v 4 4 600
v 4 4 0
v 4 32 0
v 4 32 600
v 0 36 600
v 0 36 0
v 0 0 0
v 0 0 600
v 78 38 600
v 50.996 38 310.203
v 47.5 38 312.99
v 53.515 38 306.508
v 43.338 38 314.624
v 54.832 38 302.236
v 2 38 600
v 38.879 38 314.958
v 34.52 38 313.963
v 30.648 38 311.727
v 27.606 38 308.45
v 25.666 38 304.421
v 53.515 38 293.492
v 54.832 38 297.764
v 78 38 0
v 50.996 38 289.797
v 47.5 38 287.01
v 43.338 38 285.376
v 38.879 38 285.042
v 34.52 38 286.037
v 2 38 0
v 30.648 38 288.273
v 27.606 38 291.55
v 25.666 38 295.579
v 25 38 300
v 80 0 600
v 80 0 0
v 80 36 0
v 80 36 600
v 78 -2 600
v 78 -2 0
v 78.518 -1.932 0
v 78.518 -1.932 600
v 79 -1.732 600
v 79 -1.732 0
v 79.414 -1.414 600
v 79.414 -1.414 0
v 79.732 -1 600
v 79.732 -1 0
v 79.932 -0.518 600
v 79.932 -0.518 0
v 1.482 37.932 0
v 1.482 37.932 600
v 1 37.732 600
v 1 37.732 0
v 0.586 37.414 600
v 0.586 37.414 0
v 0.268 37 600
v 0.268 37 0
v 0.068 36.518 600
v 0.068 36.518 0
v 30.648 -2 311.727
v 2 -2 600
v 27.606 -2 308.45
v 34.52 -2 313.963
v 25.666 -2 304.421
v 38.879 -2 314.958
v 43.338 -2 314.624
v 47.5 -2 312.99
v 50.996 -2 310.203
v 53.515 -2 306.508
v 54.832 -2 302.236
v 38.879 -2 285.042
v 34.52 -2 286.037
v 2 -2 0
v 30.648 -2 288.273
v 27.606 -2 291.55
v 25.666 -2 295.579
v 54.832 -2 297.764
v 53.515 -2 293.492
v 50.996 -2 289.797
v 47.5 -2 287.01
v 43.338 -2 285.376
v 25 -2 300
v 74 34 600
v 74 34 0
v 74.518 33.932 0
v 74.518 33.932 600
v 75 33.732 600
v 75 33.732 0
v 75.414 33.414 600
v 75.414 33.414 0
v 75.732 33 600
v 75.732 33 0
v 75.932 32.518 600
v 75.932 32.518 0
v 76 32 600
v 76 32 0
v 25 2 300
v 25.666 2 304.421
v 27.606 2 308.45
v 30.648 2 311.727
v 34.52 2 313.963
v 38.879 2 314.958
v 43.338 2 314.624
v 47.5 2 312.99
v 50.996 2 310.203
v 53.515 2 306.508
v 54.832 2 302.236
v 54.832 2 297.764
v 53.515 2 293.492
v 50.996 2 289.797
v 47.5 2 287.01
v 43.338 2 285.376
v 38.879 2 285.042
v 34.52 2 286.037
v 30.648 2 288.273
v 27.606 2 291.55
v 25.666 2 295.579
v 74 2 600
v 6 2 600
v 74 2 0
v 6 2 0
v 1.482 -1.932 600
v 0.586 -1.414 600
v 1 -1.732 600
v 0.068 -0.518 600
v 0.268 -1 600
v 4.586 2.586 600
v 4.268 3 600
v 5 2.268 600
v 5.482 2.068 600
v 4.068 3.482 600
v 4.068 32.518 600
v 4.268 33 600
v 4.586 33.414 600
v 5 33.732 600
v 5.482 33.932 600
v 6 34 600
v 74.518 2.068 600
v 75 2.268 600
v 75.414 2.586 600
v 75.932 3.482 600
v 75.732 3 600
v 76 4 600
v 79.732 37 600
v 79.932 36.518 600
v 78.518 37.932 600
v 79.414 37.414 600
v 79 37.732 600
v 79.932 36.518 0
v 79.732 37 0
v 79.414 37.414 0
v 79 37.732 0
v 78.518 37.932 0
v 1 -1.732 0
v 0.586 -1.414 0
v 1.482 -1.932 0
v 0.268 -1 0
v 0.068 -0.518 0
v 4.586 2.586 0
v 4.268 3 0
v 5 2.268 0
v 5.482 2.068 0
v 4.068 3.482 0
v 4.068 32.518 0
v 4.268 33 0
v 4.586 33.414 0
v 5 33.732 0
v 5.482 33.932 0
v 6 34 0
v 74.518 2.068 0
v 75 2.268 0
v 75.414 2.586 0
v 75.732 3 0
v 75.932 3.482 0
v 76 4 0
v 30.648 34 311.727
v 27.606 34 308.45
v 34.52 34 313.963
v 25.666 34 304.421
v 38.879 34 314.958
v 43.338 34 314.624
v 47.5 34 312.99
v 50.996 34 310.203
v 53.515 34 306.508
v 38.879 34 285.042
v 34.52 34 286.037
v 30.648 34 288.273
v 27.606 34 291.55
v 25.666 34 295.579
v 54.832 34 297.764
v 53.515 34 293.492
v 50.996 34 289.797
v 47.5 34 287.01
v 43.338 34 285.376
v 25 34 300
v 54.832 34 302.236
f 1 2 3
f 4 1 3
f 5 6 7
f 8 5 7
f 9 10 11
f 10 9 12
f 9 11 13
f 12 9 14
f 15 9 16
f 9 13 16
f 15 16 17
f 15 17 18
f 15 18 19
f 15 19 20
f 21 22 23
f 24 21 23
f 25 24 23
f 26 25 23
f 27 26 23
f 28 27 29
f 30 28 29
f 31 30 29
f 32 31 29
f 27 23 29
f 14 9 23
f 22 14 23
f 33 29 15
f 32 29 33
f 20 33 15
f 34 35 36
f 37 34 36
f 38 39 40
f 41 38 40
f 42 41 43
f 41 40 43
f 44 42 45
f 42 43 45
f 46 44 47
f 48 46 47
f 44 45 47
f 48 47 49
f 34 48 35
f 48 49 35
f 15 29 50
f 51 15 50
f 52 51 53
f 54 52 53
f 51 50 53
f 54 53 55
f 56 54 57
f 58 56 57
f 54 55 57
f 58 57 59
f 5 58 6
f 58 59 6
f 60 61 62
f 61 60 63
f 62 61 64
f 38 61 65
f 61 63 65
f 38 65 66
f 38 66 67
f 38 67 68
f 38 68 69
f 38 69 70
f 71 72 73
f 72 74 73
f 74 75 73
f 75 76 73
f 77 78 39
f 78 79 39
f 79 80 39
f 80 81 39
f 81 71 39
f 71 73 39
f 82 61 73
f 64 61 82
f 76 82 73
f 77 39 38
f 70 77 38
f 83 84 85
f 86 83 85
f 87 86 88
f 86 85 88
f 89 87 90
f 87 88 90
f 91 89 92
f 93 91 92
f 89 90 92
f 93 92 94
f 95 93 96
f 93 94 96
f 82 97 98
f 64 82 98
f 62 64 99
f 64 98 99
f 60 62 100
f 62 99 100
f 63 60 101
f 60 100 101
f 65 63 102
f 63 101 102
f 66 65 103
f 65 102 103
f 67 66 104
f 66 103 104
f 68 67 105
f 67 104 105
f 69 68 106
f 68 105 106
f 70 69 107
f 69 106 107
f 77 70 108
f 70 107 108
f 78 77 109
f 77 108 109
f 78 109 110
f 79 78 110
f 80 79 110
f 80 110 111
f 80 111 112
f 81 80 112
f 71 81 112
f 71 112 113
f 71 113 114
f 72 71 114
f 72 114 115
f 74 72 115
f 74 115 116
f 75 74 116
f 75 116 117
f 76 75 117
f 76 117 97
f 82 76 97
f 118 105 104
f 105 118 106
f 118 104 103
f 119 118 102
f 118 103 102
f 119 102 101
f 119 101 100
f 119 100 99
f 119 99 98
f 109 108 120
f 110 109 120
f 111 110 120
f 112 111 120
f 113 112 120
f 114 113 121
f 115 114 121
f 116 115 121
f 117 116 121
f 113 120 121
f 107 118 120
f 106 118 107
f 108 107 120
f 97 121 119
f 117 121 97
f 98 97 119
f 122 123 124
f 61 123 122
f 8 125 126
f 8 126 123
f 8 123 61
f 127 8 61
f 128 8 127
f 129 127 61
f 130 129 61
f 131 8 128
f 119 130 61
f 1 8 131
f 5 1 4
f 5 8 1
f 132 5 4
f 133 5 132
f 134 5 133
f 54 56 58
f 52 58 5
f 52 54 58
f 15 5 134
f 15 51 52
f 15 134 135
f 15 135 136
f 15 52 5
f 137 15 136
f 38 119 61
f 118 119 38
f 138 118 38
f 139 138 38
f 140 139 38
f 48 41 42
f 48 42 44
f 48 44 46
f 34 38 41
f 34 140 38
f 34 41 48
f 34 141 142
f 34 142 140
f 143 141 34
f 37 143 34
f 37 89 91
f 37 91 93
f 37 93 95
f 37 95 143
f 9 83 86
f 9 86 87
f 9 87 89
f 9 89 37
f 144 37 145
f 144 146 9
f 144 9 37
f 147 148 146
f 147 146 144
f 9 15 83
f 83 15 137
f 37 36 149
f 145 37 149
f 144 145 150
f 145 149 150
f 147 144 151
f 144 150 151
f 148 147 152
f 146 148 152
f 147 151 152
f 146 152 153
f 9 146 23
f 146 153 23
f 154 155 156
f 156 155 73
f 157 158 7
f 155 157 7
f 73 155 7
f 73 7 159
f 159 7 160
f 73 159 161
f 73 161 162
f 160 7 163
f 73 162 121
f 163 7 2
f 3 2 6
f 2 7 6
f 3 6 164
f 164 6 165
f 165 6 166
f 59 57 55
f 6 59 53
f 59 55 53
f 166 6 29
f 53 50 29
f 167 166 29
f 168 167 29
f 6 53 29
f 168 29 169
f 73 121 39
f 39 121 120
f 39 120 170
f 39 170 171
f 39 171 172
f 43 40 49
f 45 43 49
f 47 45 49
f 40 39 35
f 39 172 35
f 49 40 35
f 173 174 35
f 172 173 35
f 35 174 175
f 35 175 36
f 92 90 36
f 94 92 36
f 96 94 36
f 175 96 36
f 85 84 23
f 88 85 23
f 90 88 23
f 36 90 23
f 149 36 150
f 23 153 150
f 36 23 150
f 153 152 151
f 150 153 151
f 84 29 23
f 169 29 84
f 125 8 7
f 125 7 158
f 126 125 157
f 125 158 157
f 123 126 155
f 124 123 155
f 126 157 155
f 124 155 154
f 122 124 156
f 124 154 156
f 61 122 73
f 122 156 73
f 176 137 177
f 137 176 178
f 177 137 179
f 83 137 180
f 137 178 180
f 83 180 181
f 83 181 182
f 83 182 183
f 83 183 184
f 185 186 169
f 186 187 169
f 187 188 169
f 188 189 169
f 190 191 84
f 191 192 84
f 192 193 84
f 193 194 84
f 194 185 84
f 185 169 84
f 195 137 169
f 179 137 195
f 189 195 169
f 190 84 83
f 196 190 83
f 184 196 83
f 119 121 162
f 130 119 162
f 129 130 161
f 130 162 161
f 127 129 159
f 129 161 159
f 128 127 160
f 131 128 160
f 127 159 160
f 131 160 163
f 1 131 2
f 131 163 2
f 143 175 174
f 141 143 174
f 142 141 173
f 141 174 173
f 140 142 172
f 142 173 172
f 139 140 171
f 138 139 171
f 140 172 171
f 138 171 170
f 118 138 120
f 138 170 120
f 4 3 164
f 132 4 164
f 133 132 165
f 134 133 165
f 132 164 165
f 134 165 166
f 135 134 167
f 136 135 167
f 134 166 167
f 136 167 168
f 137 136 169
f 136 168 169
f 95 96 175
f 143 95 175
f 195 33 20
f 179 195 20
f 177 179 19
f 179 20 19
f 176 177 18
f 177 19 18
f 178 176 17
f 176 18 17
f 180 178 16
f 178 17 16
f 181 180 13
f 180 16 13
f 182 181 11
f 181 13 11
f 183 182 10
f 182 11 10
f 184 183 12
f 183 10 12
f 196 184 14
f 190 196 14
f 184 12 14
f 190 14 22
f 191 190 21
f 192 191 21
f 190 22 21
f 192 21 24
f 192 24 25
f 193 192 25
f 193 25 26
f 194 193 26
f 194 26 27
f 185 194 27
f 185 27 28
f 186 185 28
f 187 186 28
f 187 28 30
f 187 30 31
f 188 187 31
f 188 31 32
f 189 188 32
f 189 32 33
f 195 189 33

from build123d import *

# Parameters (mm, degrees)
BOSS_EXTRU_1_DEPTH      = 600
ESQUISSE2_R             = 15
ENL_V_MAT_EXTRU_1_DEPTH = 607.630035524


with BuildPart() as part:
    # Esquisse1 → Boss.-Extru.1 (new body)
    with BuildSketch(Plane.XY):
        with BuildLine():
            Line((2, -2), (78, -2))
            ThreePointArc((78, -2), (79.414213562, -1.414213562), (80, 0))
            Line((80, 0), (80, 36))
            ThreePointArc((80, 36), (79.414213562, 37.414213562), (78, 38))
            Line((78, 38), (2, 38))
            ThreePointArc((2, 38), (0.585786438, 37.414213562), (0, 36))
            Line((0, 36), (0, 0))
            ThreePointArc((0, 0), (0.585786438, -1.414213562), (2, -2))
        make_face()
        with BuildLine():
            Line((4, 4), (4, 32))
            ThreePointArc((4, 32), (4.585786438, 33.414213562), (6, 34))
            Line((6, 34), (74, 34))
            ThreePointArc((74, 34), (75.414213562, 33.414213562), (76, 32))
            Line((76, 32), (76, 4))
            ThreePointArc((76, 4), (75.414213562, 2.585786438), (74, 2))
            Line((74, 2), (6, 2))
            ThreePointArc((6, 2), (4.585786438, 2.585786438), (4, 4))
        make_face(mode=Mode.SUBTRACT)
    extrude(amount=BOSS_EXTRU_1_DEPTH)

    # Esquisse2 → Enlèv. mat.-Extru.1 (cut, through all)
    with BuildSketch(Plane(origin=(0, 38, 0), x_dir=(1, 0, 0), z_dir=(0, 1, 0))):
        with Locations(Location((40, -300, 0), (0, 0, 180))):
            Circle(ESQUISSE2_R)
    extrude(amount=-ENL_V_MAT_EXTRU_1_DEPTH, mode=Mode.SUBTRACT)


solid = part.part
